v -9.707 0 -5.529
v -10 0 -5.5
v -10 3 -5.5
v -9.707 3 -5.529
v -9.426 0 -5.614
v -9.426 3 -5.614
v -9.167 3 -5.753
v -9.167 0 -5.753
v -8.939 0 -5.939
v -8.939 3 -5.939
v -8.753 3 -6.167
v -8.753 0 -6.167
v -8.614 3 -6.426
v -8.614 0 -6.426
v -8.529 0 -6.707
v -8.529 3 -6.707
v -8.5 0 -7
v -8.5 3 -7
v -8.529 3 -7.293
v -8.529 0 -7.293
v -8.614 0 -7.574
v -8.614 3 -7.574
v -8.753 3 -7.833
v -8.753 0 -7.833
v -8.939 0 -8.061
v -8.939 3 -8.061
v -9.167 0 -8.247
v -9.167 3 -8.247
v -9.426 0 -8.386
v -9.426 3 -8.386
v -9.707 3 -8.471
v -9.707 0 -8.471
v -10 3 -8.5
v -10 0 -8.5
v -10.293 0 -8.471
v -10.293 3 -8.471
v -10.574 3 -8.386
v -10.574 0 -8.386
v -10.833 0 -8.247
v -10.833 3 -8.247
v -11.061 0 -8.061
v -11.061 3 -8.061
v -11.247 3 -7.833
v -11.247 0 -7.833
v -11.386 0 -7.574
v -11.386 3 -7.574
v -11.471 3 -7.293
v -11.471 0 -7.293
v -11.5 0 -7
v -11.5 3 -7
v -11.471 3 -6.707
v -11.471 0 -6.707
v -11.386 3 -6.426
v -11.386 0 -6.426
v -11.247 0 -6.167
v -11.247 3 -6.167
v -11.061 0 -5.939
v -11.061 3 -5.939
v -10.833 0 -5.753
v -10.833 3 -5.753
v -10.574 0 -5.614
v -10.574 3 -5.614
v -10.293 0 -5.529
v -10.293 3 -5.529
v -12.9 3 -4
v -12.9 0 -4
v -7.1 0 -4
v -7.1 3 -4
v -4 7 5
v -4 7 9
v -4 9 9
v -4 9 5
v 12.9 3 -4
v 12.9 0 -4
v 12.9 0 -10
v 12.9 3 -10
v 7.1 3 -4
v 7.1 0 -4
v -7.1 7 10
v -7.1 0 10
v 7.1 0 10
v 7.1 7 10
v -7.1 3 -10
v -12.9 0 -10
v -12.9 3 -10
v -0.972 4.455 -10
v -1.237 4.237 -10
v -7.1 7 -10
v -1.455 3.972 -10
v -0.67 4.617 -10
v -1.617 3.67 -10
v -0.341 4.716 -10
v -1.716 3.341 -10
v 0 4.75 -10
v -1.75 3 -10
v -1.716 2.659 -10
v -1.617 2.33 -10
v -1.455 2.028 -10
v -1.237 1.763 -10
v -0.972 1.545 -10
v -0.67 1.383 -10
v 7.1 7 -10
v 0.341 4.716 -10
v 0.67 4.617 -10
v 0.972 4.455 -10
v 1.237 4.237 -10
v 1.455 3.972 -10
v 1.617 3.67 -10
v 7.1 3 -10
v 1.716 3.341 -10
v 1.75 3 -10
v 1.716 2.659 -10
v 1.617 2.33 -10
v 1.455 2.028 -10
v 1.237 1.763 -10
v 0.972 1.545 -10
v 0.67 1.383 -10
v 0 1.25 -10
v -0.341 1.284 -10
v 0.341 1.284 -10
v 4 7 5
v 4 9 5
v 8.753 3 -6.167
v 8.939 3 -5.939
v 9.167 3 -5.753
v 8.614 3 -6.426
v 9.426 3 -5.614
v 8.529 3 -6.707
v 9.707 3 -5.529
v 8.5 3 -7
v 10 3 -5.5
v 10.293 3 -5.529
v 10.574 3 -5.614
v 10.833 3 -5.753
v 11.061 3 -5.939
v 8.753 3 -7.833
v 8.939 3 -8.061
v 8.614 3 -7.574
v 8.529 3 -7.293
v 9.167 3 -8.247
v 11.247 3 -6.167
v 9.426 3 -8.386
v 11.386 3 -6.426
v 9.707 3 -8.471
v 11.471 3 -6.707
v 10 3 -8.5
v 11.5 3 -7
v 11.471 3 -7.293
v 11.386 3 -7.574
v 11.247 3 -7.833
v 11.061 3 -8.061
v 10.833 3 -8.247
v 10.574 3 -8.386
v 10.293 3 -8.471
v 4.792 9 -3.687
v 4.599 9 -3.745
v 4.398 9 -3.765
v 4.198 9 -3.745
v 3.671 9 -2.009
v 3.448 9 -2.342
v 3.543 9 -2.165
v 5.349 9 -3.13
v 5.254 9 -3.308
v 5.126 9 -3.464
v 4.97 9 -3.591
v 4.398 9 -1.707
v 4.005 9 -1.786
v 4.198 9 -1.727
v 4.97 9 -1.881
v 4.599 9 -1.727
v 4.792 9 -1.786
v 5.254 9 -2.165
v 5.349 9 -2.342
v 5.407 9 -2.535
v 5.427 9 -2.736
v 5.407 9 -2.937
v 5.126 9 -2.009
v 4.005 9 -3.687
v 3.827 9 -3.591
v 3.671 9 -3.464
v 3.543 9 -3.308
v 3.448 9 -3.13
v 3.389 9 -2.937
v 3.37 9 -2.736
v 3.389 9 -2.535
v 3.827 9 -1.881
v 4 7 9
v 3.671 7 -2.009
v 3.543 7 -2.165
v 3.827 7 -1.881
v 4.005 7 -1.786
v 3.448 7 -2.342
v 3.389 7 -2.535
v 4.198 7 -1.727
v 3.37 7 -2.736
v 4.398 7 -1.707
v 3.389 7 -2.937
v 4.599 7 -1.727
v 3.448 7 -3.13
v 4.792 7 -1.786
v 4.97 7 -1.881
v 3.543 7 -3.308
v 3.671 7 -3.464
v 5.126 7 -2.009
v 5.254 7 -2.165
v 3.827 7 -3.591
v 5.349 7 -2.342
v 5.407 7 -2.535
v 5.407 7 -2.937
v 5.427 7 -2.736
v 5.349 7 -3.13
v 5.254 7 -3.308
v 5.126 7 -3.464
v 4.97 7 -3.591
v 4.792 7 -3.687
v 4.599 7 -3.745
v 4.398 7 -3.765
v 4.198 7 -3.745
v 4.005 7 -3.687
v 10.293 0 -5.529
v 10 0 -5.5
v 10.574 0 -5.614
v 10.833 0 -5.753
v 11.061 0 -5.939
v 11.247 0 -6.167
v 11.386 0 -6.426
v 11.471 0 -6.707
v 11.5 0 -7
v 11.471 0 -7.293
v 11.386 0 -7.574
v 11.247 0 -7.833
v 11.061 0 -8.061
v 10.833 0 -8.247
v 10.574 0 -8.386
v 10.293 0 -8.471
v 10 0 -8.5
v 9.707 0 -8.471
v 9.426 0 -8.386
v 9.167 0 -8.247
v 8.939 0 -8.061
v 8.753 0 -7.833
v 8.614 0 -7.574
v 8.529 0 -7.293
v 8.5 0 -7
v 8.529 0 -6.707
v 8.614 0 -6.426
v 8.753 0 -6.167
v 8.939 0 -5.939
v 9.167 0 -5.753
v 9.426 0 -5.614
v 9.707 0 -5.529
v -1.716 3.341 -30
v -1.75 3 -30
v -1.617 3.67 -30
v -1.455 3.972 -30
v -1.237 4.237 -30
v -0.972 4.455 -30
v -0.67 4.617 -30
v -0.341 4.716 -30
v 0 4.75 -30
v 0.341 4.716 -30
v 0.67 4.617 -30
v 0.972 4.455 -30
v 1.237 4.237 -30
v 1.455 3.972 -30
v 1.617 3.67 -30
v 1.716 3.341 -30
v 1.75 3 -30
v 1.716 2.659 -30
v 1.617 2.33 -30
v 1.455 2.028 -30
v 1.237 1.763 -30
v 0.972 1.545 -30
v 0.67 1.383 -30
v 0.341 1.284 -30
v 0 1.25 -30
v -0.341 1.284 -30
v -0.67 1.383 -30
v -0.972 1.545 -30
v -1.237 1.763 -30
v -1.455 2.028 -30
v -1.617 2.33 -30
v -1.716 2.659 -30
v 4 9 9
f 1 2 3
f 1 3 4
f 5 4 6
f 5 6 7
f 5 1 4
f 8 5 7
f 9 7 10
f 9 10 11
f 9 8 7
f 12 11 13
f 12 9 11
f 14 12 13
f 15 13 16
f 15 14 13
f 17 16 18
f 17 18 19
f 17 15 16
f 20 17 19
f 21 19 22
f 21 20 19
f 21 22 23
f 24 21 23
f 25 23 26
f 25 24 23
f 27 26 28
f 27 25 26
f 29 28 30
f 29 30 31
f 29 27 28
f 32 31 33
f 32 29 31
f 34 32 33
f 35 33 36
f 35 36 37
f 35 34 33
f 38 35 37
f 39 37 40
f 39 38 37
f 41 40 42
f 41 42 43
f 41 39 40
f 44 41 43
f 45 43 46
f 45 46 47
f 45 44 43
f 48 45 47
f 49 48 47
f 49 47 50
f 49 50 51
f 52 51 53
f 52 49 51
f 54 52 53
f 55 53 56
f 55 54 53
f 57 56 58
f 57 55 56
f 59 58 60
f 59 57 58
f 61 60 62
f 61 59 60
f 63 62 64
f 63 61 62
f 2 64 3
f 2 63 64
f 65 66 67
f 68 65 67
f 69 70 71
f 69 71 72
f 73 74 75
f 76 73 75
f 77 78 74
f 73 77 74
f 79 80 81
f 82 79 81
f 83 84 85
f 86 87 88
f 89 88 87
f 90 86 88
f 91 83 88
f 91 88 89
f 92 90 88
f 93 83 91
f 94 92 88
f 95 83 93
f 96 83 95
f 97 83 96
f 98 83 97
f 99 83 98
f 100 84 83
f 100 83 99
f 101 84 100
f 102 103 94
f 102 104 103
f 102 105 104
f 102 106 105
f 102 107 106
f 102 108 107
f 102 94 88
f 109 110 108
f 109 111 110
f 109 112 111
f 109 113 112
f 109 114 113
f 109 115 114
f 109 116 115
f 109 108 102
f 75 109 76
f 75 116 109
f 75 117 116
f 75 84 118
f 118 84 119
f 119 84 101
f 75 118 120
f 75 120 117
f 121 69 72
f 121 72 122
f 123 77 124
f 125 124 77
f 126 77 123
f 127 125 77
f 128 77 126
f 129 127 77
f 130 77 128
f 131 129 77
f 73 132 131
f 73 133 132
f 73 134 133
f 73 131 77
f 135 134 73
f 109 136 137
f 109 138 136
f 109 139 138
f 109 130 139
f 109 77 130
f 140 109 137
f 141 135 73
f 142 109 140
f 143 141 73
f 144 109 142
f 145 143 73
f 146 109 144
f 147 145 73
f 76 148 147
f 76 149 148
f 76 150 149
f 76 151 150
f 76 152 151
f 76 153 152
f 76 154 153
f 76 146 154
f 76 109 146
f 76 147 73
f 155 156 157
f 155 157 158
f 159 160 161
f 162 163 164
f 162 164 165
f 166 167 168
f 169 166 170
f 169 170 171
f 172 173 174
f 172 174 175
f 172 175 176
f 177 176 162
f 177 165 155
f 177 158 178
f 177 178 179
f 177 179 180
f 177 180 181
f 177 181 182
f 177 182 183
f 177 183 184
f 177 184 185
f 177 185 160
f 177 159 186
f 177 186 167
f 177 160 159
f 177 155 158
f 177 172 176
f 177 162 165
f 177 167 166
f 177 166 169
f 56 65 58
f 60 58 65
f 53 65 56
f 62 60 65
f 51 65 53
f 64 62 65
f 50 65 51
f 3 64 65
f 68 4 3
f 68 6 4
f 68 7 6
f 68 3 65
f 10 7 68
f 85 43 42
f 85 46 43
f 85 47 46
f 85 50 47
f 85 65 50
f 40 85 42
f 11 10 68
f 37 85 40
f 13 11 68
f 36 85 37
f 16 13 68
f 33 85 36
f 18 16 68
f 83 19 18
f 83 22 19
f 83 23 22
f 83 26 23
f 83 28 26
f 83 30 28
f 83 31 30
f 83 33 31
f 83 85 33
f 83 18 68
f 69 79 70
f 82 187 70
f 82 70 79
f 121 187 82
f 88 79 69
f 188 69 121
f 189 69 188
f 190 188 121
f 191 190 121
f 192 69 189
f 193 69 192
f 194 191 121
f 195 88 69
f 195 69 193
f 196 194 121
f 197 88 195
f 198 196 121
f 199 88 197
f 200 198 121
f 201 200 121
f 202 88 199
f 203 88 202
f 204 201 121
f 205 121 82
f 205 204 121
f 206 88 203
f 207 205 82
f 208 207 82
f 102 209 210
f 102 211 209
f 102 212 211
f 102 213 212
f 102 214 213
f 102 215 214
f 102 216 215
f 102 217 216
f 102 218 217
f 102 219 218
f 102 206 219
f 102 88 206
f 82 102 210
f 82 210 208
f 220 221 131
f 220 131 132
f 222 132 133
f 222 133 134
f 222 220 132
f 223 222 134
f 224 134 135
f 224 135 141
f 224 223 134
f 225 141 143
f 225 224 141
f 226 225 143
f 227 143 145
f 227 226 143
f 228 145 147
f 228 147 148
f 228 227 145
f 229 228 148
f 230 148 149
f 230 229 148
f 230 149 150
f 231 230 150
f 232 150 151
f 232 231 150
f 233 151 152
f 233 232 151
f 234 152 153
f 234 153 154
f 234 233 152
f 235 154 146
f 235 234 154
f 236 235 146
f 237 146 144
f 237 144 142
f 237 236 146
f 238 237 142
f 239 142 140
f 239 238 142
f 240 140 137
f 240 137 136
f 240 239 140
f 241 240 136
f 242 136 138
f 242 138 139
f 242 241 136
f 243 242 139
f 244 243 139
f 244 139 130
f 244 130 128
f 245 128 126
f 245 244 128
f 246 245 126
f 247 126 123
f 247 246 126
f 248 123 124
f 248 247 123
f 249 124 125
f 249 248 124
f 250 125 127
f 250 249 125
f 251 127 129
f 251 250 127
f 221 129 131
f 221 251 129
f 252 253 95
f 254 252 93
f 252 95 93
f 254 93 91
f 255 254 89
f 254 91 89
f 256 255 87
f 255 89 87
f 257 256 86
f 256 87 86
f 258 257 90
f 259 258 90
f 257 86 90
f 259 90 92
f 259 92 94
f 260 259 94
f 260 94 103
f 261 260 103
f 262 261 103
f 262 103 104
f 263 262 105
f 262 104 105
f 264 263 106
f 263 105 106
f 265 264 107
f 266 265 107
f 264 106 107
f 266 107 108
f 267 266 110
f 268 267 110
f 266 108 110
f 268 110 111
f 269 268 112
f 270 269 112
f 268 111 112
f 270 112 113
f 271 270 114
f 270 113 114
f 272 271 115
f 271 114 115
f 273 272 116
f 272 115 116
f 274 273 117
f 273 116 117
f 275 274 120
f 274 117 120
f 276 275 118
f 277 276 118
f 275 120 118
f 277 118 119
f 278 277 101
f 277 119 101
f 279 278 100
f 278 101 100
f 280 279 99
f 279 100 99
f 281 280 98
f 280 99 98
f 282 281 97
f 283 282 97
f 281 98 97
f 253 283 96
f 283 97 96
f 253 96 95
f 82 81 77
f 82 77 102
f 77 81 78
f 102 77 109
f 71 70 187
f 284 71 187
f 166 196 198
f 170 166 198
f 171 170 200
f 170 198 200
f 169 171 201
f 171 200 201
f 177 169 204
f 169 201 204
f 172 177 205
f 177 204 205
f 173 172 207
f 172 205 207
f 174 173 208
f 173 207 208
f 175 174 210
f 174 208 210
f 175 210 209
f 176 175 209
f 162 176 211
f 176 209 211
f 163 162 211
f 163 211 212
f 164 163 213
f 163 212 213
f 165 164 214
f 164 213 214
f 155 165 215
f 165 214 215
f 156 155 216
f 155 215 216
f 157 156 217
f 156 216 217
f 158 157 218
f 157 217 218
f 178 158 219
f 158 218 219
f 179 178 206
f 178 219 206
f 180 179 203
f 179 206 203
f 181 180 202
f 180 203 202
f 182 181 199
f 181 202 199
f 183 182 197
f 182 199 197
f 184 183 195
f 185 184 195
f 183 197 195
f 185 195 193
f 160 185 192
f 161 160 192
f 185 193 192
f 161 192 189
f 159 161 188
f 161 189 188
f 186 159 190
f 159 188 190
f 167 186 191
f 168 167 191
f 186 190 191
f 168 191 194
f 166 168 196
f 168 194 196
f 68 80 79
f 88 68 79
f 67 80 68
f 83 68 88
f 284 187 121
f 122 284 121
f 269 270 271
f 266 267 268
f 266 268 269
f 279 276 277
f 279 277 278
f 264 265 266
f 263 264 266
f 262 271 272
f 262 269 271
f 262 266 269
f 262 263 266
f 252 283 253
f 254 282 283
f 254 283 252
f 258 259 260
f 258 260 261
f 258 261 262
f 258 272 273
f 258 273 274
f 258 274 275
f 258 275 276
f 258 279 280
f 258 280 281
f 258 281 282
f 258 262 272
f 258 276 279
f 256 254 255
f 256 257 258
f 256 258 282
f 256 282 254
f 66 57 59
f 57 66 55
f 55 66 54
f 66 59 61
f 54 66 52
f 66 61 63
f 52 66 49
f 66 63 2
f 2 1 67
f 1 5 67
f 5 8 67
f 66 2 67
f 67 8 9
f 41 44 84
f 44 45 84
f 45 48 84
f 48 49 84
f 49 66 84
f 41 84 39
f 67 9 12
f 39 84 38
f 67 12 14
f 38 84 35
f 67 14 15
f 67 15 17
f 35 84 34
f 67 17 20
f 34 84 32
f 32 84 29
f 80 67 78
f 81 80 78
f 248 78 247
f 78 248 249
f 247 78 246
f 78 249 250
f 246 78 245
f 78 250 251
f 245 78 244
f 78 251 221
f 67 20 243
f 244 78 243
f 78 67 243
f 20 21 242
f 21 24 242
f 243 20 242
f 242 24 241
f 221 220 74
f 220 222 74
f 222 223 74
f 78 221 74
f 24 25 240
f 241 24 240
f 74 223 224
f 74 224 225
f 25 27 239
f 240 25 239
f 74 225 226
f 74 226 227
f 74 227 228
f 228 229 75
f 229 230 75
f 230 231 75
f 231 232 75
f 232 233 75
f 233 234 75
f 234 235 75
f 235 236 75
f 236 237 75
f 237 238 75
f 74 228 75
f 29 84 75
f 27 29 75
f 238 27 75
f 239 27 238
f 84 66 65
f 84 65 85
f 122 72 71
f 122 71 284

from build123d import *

# Parameters (mm, degrees)
EXTRUDE_1_DEPTH = 7
SKETCH_1_3_W    = 5.8
SKETCH_1_3_H    = 6
SKETCH_1_3_R    = 1.5
EXTRUDE_2_DEPTH = 3
SKETCH_2_W      = 8
SKETCH_2_H      = 4
EXTRUDE_3_DEPTH = 2
SKETCH_3_R      = 1.028764089
EXTRUDE_4_DEPTH = 2
SKETCH_4_R      = 1.75
EXTRUDE_5_DEPTH = 20


with BuildPart() as part:
    # 草图1 → 凸台-拉伸1 (new body)
    with BuildSketch(Plane(origin=(0, 0, 0), x_dir=(1, 0, 0), z_dir=(0, 1, 0))):
        Polygon((7.1, 10), (-7.1, 10), (-7.1, 4), (-7.1, -10), (7.1, -10), (7.1, 4), align=None)
    extrude(amount=EXTRUDE_1_DEPTH)

    # 草图1<3> → 凸台-拉伸2 (add)
    # profile 1 of 2: a face of its own
    with BuildSketch(Plane(origin=(0, 0, 0), x_dir=(1, 0, 0), z_dir=(0, 1, 0))):
        with Locations((-10, 7)):
            Rectangle(SKETCH_1_3_W, SKETCH_1_3_H)
        with Locations((-10, 7)):
            Circle(SKETCH_1_3_R, mode=Mode.SUBTRACT)
    # profile 2 of 2: a face of its own
    with BuildSketch(Plane(origin=(0, 0, 0), x_dir=(1, 0, 0), z_dir=(0, 1, 0))):
        with Locations((10, 7)):
            Rectangle(SKETCH_1_3_W, SKETCH_1_3_H)
        with Locations((10, 7)):
            Circle(SKETCH_1_3_R, mode=Mode.SUBTRACT)
    extrude(amount=EXTRUDE_2_DEPTH)

    # 草图2 → 凸台-拉伸3 (add)
    with BuildSketch(Plane(origin=(0, 7, 0), x_dir=(1, 0, 0), z_dir=(0, 1, 0))):
        with Locations((0, -7)):
            Rectangle(SKETCH_2_W, SKETCH_2_H)
    extrude(amount=EXTRUDE_3_DEPTH)

    # 草图3 → 凸台-拉伸4 (add)
    with BuildSketch(Plane(origin=(0, 7, 0), x_dir=(1, 0, 0), z_dir=(0, 1, 0))):
        with Locations((4.398397856, 2.736092563)):
            Circle(SKETCH_3_R)
    extrude(amount=EXTRUDE_4_DEPTH)

    # 草图4 → 凸台-拉伸5 (add)
    with BuildSketch(Plane(origin=(0, 0, -10), x_dir=(-1, 0, 0), z_dir=(0, 0, -1))):
        with Locations((0, 3)):
            Circle(SKETCH_4_R)
    extrude(amount=EXTRUDE_5_DEPTH)


solid = part.part
